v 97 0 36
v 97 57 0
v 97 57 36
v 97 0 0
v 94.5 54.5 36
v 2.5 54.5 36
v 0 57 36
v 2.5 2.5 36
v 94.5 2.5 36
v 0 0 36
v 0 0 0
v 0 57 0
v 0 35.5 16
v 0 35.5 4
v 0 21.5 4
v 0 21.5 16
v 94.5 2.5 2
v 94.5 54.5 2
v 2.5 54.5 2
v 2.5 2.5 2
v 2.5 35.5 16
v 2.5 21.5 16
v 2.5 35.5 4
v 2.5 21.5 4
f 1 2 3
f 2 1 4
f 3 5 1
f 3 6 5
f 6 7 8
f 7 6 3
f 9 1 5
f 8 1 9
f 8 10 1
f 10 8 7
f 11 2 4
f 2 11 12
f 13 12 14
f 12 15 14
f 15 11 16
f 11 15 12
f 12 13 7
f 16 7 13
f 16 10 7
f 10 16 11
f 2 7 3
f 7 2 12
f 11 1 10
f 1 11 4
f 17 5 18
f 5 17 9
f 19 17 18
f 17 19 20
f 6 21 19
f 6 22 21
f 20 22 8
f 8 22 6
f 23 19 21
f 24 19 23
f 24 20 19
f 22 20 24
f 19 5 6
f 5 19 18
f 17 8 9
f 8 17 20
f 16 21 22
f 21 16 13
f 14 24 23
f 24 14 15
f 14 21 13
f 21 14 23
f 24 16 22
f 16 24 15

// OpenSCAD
// Sats Card Kiosk — flat enclosure
// part = "base" or "lid"; rendered separately to two STLs.
// z = 0 is the OUTER top surface of the lid (where a card taps).
part = "base";

/* ---------- parameters ---------- */
wall     = 2.5;   // side wall thickness
floorT   = 2.0;   // base floor thickness
lidTop   = 2.0;   // lid top-plate thickness
tapFloor = 1.6;   // plastic left over the PN532 (card reads through this)
fit      = 0.4;   // clearance for friction fit
$fn      = 48;

// internal cavity (roomy — holds ESP32 + the jumper-wire nest)
inL = 92;
inW = 52;
inH = 34;         // internal depth of the base

// board pockets (with clearance)
pnL = 44;  pnW = 42;         // PN532
olL = 28;  olW = 29;         // OLED PCB
olWinL = 25; olWinW = 16;    // OLED screen window (through-hole)

// USB slot (short wall) — generous so the cable reaches regardless of height
usbW = 14; usbZ = 2; usbH = 12;

// derived
extL = inL + 2*wall;
extW = inW + 2*wall;
baseH = floorT + inH;
lipH  = 7;

// window positions along the length
olCX = 22;
pnCX = 64;
cY   = inW/2;

/* ---------- base ---------- */
module base() {
  difference() {
    cube([extL, extW, baseH]);
    translate([wall, wall, floorT]) cube([inL, inW, inH + 1]);   // hollow, open top
    translate([-1, wall + inW/2 - usbW/2, floorT + usbZ])         // USB slot
      cube([wall + 2, usbW, usbH]);
  }
}

/* ---------- lid ---------- */
module lid() {
  difference() {
    union() {
      cube([extL, extW, lidTop]);                                // top plate: z 0..lidTop
      translate([wall + fit, wall + fit, lidTop])                // lip into the base
        difference() {
          cube([inL - 2*fit, inW - 2*fit, lipH]);
          translate([wall, wall, -1])
            cube([inL - 2*fit - 2*wall, inW - 2*fit - 2*wall, lipH + 2]);
        }
    }
    // OLED screen window (through)
    translate([wall + olCX - olWinL/2, wall + cY - olWinW/2, -1])
      cube([olWinL, olWinW, lidTop + 2]);
    // OLED PCB recess from underside (leaves a ~1.2mm ledge the PCB rests on)
    translate([wall + olCX - olL/2, wall + cY - olW/2, lidTop - 0.8])
      cube([olL, olW, 14]);
    // PN532 recess from underside (leaves tapFloor over it)
    translate([wall + pnCX - pnL/2, wall + cY - pnW/2, tapFloor])
      cube([pnL, pnW, 14]);
    // engraved text on the OUTER top face
    translate([wall + pnCX, wall + cY + 12, -0.1])
      linear_extrude(0.9) text("TAP", size=6, halign="center", valign="center", font="Helvetica:style=Bold");
    translate([extL/2, wall + 2.5, -0.1])
      linear_extrude(0.9) text("SATS KIOSK", size=4.5, halign="center", valign="baseline", font="Helvetica:style=Bold");
    // engraved card outline over the tap zone
    translate([wall + pnCX, wall + cY - 1, -0.1])
      linear_extrude(0.7)
        difference() {
          square([pnL - 8, pnW - 10], center=true);
          square([pnL - 10, pnW - 12], center=true);
        }
  }
}

if (part == "base") base();
else lid();
